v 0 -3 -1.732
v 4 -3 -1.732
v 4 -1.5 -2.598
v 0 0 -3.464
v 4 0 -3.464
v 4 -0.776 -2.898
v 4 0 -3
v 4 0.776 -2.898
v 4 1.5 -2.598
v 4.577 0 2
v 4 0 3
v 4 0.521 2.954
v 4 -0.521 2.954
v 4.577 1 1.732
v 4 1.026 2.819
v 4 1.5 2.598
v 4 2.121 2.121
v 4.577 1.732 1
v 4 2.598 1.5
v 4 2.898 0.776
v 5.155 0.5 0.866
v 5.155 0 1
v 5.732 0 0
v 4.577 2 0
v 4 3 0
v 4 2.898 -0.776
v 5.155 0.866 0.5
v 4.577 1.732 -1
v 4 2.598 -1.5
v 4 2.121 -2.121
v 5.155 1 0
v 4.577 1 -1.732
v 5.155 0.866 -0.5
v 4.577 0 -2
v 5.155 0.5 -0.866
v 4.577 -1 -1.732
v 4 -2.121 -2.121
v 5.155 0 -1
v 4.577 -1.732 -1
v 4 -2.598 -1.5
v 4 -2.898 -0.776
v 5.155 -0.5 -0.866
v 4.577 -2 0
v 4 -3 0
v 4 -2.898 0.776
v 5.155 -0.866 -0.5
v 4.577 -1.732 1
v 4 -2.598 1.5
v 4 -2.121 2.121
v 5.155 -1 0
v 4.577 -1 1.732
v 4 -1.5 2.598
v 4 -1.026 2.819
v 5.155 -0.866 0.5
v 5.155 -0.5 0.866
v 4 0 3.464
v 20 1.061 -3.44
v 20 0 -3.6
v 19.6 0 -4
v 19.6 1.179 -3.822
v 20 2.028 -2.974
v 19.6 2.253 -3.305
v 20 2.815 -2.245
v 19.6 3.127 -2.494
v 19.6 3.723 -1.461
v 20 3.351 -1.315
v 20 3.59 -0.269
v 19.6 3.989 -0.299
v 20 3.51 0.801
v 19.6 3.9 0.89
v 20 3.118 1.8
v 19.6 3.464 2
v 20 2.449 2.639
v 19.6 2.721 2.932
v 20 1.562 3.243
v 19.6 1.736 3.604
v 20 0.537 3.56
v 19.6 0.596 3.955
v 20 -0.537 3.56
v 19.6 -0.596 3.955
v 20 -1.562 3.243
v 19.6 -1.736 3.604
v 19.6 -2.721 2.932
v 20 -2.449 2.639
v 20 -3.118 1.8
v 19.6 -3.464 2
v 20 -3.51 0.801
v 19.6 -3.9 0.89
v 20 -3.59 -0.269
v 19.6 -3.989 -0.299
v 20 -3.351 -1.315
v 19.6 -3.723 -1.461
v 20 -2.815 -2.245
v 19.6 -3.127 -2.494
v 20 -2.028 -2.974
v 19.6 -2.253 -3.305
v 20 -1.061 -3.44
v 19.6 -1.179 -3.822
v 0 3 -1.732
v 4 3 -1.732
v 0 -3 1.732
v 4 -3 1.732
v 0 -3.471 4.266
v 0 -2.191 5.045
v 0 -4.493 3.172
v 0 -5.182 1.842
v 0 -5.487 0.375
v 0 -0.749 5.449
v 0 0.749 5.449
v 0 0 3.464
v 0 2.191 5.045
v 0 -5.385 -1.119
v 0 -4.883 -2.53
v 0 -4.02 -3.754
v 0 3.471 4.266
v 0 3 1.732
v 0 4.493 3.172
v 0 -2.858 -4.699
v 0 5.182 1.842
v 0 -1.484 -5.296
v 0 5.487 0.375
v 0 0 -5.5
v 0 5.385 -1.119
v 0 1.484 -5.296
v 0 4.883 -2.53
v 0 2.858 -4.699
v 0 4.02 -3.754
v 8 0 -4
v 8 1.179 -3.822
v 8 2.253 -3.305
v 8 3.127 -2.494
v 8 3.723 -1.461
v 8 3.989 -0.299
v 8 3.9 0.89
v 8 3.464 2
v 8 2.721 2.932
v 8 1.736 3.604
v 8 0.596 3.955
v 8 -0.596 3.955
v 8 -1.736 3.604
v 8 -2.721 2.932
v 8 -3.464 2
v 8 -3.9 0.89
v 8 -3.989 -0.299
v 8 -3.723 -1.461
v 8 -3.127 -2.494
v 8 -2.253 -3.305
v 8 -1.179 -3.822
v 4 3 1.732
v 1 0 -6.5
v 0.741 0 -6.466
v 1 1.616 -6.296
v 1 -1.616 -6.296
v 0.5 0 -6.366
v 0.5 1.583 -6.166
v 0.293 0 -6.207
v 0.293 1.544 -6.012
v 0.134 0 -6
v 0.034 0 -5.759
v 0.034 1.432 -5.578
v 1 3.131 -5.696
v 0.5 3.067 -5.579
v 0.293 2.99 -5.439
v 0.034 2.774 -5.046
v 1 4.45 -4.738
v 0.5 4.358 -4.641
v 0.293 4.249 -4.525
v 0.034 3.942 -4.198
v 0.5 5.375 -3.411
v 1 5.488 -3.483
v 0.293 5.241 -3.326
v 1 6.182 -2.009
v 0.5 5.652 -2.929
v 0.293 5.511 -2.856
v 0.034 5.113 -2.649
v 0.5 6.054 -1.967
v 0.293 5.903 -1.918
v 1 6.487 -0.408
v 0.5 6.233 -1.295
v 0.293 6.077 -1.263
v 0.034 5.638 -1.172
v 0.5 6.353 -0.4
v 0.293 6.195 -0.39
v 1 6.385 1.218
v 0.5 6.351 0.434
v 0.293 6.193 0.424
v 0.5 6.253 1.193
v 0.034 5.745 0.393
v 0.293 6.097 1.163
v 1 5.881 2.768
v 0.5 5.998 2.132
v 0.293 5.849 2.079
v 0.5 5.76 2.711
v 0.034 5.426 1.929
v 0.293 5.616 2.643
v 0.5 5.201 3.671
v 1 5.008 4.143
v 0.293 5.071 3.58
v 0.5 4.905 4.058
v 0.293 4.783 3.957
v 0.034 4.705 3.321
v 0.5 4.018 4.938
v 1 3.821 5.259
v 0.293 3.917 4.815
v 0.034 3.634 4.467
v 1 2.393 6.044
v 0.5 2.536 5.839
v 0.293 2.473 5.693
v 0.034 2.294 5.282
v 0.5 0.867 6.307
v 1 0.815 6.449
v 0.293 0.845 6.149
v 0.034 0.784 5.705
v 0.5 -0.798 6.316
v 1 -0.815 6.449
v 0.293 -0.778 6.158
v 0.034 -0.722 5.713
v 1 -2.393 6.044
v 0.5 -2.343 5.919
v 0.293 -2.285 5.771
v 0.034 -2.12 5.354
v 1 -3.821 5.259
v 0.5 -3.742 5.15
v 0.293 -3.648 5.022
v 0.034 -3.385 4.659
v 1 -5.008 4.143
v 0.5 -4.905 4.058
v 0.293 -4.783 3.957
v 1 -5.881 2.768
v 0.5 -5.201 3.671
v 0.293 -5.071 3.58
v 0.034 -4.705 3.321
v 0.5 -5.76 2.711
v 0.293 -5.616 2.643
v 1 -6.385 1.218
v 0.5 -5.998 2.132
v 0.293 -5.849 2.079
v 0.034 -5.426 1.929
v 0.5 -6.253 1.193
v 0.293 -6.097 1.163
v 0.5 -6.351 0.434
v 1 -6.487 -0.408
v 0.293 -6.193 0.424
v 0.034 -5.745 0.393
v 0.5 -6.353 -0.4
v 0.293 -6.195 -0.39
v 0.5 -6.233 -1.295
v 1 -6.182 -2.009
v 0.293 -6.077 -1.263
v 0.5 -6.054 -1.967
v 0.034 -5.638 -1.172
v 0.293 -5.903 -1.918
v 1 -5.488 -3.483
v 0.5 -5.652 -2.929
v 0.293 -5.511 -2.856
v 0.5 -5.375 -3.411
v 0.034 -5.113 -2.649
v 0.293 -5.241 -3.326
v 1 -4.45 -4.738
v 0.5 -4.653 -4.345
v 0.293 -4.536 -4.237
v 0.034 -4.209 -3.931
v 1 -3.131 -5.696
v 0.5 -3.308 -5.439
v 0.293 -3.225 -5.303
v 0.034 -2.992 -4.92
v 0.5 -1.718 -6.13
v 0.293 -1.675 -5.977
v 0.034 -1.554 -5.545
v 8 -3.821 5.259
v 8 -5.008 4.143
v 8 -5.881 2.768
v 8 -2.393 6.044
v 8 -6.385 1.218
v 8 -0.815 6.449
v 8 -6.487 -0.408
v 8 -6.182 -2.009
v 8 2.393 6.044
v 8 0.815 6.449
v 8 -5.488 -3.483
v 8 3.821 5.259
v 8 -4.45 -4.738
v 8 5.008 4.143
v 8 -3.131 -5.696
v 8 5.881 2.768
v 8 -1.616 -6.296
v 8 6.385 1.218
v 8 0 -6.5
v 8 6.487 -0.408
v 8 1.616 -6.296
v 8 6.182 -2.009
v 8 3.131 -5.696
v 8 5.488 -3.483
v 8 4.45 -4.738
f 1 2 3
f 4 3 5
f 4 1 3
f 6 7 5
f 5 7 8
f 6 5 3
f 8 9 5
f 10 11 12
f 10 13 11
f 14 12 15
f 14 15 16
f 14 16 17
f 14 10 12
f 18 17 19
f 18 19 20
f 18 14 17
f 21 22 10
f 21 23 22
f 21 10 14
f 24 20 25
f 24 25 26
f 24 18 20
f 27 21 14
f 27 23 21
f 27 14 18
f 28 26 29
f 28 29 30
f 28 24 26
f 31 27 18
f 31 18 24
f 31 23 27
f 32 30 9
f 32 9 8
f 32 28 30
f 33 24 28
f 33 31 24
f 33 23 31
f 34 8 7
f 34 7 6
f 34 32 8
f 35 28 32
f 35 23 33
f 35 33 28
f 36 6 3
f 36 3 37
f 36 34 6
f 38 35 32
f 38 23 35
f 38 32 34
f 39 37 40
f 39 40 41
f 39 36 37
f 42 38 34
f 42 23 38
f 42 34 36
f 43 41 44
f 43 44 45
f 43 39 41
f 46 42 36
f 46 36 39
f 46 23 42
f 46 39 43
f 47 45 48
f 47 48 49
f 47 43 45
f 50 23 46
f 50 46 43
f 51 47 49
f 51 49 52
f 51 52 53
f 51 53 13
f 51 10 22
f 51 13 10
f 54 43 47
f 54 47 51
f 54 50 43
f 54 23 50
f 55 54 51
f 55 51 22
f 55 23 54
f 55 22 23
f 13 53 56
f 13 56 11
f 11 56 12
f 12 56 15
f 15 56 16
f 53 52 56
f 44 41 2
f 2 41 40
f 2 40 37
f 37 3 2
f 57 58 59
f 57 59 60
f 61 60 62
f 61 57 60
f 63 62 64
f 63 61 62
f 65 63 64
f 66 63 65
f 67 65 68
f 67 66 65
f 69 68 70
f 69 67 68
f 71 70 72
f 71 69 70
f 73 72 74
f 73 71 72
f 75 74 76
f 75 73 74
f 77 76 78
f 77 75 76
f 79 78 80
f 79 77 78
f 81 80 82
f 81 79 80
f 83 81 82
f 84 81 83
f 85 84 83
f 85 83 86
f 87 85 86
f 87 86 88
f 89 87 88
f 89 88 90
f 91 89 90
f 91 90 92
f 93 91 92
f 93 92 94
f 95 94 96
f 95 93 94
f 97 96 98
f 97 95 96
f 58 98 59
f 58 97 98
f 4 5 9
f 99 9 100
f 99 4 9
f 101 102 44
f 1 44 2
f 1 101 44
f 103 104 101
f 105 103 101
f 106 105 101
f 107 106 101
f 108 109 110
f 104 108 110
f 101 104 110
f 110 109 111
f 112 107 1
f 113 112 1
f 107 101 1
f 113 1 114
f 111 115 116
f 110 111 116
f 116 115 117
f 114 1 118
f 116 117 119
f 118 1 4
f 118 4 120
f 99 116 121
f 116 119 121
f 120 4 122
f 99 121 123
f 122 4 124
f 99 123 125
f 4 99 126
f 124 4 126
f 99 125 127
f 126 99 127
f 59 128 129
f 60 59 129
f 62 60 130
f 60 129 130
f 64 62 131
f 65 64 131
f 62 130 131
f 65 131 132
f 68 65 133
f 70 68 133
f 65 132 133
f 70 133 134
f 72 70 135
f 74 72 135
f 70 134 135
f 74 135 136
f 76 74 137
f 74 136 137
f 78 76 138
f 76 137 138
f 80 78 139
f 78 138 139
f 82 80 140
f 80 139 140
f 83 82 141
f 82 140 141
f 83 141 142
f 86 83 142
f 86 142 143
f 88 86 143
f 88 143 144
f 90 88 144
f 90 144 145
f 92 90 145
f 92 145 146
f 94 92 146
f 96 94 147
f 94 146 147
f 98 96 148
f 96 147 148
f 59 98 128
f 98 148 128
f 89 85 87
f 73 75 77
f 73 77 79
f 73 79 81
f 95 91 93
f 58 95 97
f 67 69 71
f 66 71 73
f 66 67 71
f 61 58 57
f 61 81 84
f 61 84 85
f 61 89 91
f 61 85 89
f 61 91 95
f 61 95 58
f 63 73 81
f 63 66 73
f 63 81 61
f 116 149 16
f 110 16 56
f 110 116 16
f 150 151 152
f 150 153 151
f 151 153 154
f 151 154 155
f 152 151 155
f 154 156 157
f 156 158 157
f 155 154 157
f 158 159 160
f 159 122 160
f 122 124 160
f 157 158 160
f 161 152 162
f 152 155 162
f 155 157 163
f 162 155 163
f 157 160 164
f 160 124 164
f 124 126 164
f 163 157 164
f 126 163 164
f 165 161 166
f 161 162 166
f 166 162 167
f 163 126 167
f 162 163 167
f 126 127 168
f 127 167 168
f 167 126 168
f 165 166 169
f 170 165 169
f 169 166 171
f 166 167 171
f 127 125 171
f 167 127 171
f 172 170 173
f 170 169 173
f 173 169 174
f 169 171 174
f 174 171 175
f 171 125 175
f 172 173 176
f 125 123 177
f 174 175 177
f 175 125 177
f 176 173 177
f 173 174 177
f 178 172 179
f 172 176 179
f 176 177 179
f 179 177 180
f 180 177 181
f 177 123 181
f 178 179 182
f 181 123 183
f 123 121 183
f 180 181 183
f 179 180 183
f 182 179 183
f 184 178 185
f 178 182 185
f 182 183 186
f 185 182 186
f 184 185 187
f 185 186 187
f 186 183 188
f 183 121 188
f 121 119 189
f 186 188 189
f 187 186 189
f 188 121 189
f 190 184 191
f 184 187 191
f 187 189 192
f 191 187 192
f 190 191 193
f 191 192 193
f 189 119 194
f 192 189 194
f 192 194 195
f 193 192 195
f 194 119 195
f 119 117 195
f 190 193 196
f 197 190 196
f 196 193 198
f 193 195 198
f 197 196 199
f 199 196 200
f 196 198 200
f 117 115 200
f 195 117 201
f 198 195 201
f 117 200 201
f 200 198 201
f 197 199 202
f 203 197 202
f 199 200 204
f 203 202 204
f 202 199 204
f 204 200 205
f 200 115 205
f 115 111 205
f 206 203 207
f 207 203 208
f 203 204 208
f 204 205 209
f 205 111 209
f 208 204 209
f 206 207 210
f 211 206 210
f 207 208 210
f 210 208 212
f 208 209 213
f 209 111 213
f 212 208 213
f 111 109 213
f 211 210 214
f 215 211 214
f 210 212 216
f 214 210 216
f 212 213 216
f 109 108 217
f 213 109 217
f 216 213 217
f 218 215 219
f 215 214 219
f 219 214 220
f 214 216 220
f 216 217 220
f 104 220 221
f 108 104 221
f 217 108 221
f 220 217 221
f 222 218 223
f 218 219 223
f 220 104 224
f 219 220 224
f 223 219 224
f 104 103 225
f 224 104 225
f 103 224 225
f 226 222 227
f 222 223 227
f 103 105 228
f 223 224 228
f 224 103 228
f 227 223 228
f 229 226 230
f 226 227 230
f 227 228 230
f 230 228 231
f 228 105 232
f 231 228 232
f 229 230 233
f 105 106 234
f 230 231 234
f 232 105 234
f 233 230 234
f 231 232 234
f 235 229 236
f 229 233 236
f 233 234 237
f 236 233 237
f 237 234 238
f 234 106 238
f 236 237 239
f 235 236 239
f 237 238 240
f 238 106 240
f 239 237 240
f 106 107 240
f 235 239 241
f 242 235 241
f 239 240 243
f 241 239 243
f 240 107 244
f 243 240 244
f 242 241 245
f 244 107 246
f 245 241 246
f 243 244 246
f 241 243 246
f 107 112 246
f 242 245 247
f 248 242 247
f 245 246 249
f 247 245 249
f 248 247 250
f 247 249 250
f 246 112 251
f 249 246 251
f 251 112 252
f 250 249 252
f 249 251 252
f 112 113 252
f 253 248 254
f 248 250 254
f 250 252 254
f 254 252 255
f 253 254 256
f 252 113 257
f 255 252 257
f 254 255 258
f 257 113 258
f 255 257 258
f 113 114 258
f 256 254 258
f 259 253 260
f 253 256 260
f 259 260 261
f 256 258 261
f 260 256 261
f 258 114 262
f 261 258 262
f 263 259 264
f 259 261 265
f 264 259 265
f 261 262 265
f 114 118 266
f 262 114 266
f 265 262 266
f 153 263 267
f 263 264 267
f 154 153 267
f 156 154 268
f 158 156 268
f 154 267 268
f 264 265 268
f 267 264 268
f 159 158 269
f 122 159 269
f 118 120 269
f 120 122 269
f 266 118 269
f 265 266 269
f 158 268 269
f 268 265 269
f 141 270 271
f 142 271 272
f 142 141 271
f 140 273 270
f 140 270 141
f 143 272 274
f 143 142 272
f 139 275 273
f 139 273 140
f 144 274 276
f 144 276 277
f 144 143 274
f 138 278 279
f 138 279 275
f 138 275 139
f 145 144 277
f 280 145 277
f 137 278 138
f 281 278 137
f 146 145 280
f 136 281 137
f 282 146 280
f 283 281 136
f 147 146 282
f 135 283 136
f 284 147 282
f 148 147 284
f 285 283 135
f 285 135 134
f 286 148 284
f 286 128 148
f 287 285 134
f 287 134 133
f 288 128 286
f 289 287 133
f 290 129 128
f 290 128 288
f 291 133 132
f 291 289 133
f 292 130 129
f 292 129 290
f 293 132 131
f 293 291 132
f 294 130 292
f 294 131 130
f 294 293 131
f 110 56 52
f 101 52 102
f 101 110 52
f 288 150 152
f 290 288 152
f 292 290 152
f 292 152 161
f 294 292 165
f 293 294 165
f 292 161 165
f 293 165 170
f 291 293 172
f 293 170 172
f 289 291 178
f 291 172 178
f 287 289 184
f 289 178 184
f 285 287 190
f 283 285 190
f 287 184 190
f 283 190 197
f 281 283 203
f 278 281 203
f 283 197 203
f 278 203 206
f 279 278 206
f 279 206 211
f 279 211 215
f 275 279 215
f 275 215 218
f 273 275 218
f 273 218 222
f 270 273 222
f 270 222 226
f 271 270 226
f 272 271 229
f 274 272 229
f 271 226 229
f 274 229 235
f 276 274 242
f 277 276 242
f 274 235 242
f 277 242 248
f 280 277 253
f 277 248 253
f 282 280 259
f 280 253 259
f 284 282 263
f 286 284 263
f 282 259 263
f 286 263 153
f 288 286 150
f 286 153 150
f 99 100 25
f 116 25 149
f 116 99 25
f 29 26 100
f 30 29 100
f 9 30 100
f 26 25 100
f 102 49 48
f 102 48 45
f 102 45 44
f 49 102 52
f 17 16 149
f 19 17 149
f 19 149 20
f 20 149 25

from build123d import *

# Parameters (mm, degrees)
SKETCH1_R           = 6.5
BASEHEAD_DEPTH      = 8
SKETCH2_R           = 4
BASEBODY_DEPTH      = 12
HEXAGONSOCKET_DEPTH = 4
TOPFILLET_R         = 1
CHAMFER1_SIZE       = 0.4


with BuildPart() as part:
    # Sketch1 → BaseHead (new body)
    with BuildSketch(Plane(origin=(0, 0, 0), x_dir=(0, 0, -1), z_dir=(1, 0, 0))):
        Circle(SKETCH1_R)
    extrude(amount=BASEHEAD_DEPTH)

    # Sketch2 → BaseBody (add)
    with BuildSketch(Plane(origin=(8, 0, 0), x_dir=(0, 0, -1), z_dir=(1, 0, 0))):
        Circle(SKETCH2_R)
    extrude(amount=BASEBODY_DEPTH)

    # Sketch3 → HexagonSocket (cut)
    with BuildSketch(Plane(origin=(0, 0, 0), x_dir=(0, 0, -1), z_dir=(1, 0, 0))):
        Polygon((3.464101615, 0), (1.732050808, 3), (-1.732050808, 3), (-3.464101615, 0), (-1.732050808, -3), (1.732050808, -3), align=None)
    extrude(amount=HEXAGONSOCKET_DEPTH, mode=Mode.SUBTRACT)

    # Sketch4 → Cut-Revolve1 (revolve, cut)
    with BuildSketch(Plane(origin=(-4.19613823, 0.75, 0), x_dir=(-1, 0, 0), z_dir=(0, 0, 1)), mode=Mode.PRIVATE) as cut_revolve1_sk:
        Polygon((-8.19613823, 3.75), (-9.928189037, 0.75), (-8.19613823, 0.75), align=None)
    revolve(cut_revolve1_sk.sketch.rotate(Axis((0.838992387, 0, 0), (-1, 0, 0)), 90), axis=Axis((0.838992387, 0, 0), (-1, 0, 0)), mode=Mode.SUBTRACT)

    # TopFillet
    topfillet_edges = [part.edges().sort_by_distance(p)[0] for p in [
        (0, 0, 6.5),
    ]]
    fillet(topfillet_edges, radius=TOPFILLET_R)

    # Chamfer1
    chamfer1_edges = [part.edges().sort_by_distance(p)[0] for p in [
        (20, 0, 4),
    ]]
    chamfer(chamfer1_edges, length=CHAMFER1_SIZE)


solid = part.part
